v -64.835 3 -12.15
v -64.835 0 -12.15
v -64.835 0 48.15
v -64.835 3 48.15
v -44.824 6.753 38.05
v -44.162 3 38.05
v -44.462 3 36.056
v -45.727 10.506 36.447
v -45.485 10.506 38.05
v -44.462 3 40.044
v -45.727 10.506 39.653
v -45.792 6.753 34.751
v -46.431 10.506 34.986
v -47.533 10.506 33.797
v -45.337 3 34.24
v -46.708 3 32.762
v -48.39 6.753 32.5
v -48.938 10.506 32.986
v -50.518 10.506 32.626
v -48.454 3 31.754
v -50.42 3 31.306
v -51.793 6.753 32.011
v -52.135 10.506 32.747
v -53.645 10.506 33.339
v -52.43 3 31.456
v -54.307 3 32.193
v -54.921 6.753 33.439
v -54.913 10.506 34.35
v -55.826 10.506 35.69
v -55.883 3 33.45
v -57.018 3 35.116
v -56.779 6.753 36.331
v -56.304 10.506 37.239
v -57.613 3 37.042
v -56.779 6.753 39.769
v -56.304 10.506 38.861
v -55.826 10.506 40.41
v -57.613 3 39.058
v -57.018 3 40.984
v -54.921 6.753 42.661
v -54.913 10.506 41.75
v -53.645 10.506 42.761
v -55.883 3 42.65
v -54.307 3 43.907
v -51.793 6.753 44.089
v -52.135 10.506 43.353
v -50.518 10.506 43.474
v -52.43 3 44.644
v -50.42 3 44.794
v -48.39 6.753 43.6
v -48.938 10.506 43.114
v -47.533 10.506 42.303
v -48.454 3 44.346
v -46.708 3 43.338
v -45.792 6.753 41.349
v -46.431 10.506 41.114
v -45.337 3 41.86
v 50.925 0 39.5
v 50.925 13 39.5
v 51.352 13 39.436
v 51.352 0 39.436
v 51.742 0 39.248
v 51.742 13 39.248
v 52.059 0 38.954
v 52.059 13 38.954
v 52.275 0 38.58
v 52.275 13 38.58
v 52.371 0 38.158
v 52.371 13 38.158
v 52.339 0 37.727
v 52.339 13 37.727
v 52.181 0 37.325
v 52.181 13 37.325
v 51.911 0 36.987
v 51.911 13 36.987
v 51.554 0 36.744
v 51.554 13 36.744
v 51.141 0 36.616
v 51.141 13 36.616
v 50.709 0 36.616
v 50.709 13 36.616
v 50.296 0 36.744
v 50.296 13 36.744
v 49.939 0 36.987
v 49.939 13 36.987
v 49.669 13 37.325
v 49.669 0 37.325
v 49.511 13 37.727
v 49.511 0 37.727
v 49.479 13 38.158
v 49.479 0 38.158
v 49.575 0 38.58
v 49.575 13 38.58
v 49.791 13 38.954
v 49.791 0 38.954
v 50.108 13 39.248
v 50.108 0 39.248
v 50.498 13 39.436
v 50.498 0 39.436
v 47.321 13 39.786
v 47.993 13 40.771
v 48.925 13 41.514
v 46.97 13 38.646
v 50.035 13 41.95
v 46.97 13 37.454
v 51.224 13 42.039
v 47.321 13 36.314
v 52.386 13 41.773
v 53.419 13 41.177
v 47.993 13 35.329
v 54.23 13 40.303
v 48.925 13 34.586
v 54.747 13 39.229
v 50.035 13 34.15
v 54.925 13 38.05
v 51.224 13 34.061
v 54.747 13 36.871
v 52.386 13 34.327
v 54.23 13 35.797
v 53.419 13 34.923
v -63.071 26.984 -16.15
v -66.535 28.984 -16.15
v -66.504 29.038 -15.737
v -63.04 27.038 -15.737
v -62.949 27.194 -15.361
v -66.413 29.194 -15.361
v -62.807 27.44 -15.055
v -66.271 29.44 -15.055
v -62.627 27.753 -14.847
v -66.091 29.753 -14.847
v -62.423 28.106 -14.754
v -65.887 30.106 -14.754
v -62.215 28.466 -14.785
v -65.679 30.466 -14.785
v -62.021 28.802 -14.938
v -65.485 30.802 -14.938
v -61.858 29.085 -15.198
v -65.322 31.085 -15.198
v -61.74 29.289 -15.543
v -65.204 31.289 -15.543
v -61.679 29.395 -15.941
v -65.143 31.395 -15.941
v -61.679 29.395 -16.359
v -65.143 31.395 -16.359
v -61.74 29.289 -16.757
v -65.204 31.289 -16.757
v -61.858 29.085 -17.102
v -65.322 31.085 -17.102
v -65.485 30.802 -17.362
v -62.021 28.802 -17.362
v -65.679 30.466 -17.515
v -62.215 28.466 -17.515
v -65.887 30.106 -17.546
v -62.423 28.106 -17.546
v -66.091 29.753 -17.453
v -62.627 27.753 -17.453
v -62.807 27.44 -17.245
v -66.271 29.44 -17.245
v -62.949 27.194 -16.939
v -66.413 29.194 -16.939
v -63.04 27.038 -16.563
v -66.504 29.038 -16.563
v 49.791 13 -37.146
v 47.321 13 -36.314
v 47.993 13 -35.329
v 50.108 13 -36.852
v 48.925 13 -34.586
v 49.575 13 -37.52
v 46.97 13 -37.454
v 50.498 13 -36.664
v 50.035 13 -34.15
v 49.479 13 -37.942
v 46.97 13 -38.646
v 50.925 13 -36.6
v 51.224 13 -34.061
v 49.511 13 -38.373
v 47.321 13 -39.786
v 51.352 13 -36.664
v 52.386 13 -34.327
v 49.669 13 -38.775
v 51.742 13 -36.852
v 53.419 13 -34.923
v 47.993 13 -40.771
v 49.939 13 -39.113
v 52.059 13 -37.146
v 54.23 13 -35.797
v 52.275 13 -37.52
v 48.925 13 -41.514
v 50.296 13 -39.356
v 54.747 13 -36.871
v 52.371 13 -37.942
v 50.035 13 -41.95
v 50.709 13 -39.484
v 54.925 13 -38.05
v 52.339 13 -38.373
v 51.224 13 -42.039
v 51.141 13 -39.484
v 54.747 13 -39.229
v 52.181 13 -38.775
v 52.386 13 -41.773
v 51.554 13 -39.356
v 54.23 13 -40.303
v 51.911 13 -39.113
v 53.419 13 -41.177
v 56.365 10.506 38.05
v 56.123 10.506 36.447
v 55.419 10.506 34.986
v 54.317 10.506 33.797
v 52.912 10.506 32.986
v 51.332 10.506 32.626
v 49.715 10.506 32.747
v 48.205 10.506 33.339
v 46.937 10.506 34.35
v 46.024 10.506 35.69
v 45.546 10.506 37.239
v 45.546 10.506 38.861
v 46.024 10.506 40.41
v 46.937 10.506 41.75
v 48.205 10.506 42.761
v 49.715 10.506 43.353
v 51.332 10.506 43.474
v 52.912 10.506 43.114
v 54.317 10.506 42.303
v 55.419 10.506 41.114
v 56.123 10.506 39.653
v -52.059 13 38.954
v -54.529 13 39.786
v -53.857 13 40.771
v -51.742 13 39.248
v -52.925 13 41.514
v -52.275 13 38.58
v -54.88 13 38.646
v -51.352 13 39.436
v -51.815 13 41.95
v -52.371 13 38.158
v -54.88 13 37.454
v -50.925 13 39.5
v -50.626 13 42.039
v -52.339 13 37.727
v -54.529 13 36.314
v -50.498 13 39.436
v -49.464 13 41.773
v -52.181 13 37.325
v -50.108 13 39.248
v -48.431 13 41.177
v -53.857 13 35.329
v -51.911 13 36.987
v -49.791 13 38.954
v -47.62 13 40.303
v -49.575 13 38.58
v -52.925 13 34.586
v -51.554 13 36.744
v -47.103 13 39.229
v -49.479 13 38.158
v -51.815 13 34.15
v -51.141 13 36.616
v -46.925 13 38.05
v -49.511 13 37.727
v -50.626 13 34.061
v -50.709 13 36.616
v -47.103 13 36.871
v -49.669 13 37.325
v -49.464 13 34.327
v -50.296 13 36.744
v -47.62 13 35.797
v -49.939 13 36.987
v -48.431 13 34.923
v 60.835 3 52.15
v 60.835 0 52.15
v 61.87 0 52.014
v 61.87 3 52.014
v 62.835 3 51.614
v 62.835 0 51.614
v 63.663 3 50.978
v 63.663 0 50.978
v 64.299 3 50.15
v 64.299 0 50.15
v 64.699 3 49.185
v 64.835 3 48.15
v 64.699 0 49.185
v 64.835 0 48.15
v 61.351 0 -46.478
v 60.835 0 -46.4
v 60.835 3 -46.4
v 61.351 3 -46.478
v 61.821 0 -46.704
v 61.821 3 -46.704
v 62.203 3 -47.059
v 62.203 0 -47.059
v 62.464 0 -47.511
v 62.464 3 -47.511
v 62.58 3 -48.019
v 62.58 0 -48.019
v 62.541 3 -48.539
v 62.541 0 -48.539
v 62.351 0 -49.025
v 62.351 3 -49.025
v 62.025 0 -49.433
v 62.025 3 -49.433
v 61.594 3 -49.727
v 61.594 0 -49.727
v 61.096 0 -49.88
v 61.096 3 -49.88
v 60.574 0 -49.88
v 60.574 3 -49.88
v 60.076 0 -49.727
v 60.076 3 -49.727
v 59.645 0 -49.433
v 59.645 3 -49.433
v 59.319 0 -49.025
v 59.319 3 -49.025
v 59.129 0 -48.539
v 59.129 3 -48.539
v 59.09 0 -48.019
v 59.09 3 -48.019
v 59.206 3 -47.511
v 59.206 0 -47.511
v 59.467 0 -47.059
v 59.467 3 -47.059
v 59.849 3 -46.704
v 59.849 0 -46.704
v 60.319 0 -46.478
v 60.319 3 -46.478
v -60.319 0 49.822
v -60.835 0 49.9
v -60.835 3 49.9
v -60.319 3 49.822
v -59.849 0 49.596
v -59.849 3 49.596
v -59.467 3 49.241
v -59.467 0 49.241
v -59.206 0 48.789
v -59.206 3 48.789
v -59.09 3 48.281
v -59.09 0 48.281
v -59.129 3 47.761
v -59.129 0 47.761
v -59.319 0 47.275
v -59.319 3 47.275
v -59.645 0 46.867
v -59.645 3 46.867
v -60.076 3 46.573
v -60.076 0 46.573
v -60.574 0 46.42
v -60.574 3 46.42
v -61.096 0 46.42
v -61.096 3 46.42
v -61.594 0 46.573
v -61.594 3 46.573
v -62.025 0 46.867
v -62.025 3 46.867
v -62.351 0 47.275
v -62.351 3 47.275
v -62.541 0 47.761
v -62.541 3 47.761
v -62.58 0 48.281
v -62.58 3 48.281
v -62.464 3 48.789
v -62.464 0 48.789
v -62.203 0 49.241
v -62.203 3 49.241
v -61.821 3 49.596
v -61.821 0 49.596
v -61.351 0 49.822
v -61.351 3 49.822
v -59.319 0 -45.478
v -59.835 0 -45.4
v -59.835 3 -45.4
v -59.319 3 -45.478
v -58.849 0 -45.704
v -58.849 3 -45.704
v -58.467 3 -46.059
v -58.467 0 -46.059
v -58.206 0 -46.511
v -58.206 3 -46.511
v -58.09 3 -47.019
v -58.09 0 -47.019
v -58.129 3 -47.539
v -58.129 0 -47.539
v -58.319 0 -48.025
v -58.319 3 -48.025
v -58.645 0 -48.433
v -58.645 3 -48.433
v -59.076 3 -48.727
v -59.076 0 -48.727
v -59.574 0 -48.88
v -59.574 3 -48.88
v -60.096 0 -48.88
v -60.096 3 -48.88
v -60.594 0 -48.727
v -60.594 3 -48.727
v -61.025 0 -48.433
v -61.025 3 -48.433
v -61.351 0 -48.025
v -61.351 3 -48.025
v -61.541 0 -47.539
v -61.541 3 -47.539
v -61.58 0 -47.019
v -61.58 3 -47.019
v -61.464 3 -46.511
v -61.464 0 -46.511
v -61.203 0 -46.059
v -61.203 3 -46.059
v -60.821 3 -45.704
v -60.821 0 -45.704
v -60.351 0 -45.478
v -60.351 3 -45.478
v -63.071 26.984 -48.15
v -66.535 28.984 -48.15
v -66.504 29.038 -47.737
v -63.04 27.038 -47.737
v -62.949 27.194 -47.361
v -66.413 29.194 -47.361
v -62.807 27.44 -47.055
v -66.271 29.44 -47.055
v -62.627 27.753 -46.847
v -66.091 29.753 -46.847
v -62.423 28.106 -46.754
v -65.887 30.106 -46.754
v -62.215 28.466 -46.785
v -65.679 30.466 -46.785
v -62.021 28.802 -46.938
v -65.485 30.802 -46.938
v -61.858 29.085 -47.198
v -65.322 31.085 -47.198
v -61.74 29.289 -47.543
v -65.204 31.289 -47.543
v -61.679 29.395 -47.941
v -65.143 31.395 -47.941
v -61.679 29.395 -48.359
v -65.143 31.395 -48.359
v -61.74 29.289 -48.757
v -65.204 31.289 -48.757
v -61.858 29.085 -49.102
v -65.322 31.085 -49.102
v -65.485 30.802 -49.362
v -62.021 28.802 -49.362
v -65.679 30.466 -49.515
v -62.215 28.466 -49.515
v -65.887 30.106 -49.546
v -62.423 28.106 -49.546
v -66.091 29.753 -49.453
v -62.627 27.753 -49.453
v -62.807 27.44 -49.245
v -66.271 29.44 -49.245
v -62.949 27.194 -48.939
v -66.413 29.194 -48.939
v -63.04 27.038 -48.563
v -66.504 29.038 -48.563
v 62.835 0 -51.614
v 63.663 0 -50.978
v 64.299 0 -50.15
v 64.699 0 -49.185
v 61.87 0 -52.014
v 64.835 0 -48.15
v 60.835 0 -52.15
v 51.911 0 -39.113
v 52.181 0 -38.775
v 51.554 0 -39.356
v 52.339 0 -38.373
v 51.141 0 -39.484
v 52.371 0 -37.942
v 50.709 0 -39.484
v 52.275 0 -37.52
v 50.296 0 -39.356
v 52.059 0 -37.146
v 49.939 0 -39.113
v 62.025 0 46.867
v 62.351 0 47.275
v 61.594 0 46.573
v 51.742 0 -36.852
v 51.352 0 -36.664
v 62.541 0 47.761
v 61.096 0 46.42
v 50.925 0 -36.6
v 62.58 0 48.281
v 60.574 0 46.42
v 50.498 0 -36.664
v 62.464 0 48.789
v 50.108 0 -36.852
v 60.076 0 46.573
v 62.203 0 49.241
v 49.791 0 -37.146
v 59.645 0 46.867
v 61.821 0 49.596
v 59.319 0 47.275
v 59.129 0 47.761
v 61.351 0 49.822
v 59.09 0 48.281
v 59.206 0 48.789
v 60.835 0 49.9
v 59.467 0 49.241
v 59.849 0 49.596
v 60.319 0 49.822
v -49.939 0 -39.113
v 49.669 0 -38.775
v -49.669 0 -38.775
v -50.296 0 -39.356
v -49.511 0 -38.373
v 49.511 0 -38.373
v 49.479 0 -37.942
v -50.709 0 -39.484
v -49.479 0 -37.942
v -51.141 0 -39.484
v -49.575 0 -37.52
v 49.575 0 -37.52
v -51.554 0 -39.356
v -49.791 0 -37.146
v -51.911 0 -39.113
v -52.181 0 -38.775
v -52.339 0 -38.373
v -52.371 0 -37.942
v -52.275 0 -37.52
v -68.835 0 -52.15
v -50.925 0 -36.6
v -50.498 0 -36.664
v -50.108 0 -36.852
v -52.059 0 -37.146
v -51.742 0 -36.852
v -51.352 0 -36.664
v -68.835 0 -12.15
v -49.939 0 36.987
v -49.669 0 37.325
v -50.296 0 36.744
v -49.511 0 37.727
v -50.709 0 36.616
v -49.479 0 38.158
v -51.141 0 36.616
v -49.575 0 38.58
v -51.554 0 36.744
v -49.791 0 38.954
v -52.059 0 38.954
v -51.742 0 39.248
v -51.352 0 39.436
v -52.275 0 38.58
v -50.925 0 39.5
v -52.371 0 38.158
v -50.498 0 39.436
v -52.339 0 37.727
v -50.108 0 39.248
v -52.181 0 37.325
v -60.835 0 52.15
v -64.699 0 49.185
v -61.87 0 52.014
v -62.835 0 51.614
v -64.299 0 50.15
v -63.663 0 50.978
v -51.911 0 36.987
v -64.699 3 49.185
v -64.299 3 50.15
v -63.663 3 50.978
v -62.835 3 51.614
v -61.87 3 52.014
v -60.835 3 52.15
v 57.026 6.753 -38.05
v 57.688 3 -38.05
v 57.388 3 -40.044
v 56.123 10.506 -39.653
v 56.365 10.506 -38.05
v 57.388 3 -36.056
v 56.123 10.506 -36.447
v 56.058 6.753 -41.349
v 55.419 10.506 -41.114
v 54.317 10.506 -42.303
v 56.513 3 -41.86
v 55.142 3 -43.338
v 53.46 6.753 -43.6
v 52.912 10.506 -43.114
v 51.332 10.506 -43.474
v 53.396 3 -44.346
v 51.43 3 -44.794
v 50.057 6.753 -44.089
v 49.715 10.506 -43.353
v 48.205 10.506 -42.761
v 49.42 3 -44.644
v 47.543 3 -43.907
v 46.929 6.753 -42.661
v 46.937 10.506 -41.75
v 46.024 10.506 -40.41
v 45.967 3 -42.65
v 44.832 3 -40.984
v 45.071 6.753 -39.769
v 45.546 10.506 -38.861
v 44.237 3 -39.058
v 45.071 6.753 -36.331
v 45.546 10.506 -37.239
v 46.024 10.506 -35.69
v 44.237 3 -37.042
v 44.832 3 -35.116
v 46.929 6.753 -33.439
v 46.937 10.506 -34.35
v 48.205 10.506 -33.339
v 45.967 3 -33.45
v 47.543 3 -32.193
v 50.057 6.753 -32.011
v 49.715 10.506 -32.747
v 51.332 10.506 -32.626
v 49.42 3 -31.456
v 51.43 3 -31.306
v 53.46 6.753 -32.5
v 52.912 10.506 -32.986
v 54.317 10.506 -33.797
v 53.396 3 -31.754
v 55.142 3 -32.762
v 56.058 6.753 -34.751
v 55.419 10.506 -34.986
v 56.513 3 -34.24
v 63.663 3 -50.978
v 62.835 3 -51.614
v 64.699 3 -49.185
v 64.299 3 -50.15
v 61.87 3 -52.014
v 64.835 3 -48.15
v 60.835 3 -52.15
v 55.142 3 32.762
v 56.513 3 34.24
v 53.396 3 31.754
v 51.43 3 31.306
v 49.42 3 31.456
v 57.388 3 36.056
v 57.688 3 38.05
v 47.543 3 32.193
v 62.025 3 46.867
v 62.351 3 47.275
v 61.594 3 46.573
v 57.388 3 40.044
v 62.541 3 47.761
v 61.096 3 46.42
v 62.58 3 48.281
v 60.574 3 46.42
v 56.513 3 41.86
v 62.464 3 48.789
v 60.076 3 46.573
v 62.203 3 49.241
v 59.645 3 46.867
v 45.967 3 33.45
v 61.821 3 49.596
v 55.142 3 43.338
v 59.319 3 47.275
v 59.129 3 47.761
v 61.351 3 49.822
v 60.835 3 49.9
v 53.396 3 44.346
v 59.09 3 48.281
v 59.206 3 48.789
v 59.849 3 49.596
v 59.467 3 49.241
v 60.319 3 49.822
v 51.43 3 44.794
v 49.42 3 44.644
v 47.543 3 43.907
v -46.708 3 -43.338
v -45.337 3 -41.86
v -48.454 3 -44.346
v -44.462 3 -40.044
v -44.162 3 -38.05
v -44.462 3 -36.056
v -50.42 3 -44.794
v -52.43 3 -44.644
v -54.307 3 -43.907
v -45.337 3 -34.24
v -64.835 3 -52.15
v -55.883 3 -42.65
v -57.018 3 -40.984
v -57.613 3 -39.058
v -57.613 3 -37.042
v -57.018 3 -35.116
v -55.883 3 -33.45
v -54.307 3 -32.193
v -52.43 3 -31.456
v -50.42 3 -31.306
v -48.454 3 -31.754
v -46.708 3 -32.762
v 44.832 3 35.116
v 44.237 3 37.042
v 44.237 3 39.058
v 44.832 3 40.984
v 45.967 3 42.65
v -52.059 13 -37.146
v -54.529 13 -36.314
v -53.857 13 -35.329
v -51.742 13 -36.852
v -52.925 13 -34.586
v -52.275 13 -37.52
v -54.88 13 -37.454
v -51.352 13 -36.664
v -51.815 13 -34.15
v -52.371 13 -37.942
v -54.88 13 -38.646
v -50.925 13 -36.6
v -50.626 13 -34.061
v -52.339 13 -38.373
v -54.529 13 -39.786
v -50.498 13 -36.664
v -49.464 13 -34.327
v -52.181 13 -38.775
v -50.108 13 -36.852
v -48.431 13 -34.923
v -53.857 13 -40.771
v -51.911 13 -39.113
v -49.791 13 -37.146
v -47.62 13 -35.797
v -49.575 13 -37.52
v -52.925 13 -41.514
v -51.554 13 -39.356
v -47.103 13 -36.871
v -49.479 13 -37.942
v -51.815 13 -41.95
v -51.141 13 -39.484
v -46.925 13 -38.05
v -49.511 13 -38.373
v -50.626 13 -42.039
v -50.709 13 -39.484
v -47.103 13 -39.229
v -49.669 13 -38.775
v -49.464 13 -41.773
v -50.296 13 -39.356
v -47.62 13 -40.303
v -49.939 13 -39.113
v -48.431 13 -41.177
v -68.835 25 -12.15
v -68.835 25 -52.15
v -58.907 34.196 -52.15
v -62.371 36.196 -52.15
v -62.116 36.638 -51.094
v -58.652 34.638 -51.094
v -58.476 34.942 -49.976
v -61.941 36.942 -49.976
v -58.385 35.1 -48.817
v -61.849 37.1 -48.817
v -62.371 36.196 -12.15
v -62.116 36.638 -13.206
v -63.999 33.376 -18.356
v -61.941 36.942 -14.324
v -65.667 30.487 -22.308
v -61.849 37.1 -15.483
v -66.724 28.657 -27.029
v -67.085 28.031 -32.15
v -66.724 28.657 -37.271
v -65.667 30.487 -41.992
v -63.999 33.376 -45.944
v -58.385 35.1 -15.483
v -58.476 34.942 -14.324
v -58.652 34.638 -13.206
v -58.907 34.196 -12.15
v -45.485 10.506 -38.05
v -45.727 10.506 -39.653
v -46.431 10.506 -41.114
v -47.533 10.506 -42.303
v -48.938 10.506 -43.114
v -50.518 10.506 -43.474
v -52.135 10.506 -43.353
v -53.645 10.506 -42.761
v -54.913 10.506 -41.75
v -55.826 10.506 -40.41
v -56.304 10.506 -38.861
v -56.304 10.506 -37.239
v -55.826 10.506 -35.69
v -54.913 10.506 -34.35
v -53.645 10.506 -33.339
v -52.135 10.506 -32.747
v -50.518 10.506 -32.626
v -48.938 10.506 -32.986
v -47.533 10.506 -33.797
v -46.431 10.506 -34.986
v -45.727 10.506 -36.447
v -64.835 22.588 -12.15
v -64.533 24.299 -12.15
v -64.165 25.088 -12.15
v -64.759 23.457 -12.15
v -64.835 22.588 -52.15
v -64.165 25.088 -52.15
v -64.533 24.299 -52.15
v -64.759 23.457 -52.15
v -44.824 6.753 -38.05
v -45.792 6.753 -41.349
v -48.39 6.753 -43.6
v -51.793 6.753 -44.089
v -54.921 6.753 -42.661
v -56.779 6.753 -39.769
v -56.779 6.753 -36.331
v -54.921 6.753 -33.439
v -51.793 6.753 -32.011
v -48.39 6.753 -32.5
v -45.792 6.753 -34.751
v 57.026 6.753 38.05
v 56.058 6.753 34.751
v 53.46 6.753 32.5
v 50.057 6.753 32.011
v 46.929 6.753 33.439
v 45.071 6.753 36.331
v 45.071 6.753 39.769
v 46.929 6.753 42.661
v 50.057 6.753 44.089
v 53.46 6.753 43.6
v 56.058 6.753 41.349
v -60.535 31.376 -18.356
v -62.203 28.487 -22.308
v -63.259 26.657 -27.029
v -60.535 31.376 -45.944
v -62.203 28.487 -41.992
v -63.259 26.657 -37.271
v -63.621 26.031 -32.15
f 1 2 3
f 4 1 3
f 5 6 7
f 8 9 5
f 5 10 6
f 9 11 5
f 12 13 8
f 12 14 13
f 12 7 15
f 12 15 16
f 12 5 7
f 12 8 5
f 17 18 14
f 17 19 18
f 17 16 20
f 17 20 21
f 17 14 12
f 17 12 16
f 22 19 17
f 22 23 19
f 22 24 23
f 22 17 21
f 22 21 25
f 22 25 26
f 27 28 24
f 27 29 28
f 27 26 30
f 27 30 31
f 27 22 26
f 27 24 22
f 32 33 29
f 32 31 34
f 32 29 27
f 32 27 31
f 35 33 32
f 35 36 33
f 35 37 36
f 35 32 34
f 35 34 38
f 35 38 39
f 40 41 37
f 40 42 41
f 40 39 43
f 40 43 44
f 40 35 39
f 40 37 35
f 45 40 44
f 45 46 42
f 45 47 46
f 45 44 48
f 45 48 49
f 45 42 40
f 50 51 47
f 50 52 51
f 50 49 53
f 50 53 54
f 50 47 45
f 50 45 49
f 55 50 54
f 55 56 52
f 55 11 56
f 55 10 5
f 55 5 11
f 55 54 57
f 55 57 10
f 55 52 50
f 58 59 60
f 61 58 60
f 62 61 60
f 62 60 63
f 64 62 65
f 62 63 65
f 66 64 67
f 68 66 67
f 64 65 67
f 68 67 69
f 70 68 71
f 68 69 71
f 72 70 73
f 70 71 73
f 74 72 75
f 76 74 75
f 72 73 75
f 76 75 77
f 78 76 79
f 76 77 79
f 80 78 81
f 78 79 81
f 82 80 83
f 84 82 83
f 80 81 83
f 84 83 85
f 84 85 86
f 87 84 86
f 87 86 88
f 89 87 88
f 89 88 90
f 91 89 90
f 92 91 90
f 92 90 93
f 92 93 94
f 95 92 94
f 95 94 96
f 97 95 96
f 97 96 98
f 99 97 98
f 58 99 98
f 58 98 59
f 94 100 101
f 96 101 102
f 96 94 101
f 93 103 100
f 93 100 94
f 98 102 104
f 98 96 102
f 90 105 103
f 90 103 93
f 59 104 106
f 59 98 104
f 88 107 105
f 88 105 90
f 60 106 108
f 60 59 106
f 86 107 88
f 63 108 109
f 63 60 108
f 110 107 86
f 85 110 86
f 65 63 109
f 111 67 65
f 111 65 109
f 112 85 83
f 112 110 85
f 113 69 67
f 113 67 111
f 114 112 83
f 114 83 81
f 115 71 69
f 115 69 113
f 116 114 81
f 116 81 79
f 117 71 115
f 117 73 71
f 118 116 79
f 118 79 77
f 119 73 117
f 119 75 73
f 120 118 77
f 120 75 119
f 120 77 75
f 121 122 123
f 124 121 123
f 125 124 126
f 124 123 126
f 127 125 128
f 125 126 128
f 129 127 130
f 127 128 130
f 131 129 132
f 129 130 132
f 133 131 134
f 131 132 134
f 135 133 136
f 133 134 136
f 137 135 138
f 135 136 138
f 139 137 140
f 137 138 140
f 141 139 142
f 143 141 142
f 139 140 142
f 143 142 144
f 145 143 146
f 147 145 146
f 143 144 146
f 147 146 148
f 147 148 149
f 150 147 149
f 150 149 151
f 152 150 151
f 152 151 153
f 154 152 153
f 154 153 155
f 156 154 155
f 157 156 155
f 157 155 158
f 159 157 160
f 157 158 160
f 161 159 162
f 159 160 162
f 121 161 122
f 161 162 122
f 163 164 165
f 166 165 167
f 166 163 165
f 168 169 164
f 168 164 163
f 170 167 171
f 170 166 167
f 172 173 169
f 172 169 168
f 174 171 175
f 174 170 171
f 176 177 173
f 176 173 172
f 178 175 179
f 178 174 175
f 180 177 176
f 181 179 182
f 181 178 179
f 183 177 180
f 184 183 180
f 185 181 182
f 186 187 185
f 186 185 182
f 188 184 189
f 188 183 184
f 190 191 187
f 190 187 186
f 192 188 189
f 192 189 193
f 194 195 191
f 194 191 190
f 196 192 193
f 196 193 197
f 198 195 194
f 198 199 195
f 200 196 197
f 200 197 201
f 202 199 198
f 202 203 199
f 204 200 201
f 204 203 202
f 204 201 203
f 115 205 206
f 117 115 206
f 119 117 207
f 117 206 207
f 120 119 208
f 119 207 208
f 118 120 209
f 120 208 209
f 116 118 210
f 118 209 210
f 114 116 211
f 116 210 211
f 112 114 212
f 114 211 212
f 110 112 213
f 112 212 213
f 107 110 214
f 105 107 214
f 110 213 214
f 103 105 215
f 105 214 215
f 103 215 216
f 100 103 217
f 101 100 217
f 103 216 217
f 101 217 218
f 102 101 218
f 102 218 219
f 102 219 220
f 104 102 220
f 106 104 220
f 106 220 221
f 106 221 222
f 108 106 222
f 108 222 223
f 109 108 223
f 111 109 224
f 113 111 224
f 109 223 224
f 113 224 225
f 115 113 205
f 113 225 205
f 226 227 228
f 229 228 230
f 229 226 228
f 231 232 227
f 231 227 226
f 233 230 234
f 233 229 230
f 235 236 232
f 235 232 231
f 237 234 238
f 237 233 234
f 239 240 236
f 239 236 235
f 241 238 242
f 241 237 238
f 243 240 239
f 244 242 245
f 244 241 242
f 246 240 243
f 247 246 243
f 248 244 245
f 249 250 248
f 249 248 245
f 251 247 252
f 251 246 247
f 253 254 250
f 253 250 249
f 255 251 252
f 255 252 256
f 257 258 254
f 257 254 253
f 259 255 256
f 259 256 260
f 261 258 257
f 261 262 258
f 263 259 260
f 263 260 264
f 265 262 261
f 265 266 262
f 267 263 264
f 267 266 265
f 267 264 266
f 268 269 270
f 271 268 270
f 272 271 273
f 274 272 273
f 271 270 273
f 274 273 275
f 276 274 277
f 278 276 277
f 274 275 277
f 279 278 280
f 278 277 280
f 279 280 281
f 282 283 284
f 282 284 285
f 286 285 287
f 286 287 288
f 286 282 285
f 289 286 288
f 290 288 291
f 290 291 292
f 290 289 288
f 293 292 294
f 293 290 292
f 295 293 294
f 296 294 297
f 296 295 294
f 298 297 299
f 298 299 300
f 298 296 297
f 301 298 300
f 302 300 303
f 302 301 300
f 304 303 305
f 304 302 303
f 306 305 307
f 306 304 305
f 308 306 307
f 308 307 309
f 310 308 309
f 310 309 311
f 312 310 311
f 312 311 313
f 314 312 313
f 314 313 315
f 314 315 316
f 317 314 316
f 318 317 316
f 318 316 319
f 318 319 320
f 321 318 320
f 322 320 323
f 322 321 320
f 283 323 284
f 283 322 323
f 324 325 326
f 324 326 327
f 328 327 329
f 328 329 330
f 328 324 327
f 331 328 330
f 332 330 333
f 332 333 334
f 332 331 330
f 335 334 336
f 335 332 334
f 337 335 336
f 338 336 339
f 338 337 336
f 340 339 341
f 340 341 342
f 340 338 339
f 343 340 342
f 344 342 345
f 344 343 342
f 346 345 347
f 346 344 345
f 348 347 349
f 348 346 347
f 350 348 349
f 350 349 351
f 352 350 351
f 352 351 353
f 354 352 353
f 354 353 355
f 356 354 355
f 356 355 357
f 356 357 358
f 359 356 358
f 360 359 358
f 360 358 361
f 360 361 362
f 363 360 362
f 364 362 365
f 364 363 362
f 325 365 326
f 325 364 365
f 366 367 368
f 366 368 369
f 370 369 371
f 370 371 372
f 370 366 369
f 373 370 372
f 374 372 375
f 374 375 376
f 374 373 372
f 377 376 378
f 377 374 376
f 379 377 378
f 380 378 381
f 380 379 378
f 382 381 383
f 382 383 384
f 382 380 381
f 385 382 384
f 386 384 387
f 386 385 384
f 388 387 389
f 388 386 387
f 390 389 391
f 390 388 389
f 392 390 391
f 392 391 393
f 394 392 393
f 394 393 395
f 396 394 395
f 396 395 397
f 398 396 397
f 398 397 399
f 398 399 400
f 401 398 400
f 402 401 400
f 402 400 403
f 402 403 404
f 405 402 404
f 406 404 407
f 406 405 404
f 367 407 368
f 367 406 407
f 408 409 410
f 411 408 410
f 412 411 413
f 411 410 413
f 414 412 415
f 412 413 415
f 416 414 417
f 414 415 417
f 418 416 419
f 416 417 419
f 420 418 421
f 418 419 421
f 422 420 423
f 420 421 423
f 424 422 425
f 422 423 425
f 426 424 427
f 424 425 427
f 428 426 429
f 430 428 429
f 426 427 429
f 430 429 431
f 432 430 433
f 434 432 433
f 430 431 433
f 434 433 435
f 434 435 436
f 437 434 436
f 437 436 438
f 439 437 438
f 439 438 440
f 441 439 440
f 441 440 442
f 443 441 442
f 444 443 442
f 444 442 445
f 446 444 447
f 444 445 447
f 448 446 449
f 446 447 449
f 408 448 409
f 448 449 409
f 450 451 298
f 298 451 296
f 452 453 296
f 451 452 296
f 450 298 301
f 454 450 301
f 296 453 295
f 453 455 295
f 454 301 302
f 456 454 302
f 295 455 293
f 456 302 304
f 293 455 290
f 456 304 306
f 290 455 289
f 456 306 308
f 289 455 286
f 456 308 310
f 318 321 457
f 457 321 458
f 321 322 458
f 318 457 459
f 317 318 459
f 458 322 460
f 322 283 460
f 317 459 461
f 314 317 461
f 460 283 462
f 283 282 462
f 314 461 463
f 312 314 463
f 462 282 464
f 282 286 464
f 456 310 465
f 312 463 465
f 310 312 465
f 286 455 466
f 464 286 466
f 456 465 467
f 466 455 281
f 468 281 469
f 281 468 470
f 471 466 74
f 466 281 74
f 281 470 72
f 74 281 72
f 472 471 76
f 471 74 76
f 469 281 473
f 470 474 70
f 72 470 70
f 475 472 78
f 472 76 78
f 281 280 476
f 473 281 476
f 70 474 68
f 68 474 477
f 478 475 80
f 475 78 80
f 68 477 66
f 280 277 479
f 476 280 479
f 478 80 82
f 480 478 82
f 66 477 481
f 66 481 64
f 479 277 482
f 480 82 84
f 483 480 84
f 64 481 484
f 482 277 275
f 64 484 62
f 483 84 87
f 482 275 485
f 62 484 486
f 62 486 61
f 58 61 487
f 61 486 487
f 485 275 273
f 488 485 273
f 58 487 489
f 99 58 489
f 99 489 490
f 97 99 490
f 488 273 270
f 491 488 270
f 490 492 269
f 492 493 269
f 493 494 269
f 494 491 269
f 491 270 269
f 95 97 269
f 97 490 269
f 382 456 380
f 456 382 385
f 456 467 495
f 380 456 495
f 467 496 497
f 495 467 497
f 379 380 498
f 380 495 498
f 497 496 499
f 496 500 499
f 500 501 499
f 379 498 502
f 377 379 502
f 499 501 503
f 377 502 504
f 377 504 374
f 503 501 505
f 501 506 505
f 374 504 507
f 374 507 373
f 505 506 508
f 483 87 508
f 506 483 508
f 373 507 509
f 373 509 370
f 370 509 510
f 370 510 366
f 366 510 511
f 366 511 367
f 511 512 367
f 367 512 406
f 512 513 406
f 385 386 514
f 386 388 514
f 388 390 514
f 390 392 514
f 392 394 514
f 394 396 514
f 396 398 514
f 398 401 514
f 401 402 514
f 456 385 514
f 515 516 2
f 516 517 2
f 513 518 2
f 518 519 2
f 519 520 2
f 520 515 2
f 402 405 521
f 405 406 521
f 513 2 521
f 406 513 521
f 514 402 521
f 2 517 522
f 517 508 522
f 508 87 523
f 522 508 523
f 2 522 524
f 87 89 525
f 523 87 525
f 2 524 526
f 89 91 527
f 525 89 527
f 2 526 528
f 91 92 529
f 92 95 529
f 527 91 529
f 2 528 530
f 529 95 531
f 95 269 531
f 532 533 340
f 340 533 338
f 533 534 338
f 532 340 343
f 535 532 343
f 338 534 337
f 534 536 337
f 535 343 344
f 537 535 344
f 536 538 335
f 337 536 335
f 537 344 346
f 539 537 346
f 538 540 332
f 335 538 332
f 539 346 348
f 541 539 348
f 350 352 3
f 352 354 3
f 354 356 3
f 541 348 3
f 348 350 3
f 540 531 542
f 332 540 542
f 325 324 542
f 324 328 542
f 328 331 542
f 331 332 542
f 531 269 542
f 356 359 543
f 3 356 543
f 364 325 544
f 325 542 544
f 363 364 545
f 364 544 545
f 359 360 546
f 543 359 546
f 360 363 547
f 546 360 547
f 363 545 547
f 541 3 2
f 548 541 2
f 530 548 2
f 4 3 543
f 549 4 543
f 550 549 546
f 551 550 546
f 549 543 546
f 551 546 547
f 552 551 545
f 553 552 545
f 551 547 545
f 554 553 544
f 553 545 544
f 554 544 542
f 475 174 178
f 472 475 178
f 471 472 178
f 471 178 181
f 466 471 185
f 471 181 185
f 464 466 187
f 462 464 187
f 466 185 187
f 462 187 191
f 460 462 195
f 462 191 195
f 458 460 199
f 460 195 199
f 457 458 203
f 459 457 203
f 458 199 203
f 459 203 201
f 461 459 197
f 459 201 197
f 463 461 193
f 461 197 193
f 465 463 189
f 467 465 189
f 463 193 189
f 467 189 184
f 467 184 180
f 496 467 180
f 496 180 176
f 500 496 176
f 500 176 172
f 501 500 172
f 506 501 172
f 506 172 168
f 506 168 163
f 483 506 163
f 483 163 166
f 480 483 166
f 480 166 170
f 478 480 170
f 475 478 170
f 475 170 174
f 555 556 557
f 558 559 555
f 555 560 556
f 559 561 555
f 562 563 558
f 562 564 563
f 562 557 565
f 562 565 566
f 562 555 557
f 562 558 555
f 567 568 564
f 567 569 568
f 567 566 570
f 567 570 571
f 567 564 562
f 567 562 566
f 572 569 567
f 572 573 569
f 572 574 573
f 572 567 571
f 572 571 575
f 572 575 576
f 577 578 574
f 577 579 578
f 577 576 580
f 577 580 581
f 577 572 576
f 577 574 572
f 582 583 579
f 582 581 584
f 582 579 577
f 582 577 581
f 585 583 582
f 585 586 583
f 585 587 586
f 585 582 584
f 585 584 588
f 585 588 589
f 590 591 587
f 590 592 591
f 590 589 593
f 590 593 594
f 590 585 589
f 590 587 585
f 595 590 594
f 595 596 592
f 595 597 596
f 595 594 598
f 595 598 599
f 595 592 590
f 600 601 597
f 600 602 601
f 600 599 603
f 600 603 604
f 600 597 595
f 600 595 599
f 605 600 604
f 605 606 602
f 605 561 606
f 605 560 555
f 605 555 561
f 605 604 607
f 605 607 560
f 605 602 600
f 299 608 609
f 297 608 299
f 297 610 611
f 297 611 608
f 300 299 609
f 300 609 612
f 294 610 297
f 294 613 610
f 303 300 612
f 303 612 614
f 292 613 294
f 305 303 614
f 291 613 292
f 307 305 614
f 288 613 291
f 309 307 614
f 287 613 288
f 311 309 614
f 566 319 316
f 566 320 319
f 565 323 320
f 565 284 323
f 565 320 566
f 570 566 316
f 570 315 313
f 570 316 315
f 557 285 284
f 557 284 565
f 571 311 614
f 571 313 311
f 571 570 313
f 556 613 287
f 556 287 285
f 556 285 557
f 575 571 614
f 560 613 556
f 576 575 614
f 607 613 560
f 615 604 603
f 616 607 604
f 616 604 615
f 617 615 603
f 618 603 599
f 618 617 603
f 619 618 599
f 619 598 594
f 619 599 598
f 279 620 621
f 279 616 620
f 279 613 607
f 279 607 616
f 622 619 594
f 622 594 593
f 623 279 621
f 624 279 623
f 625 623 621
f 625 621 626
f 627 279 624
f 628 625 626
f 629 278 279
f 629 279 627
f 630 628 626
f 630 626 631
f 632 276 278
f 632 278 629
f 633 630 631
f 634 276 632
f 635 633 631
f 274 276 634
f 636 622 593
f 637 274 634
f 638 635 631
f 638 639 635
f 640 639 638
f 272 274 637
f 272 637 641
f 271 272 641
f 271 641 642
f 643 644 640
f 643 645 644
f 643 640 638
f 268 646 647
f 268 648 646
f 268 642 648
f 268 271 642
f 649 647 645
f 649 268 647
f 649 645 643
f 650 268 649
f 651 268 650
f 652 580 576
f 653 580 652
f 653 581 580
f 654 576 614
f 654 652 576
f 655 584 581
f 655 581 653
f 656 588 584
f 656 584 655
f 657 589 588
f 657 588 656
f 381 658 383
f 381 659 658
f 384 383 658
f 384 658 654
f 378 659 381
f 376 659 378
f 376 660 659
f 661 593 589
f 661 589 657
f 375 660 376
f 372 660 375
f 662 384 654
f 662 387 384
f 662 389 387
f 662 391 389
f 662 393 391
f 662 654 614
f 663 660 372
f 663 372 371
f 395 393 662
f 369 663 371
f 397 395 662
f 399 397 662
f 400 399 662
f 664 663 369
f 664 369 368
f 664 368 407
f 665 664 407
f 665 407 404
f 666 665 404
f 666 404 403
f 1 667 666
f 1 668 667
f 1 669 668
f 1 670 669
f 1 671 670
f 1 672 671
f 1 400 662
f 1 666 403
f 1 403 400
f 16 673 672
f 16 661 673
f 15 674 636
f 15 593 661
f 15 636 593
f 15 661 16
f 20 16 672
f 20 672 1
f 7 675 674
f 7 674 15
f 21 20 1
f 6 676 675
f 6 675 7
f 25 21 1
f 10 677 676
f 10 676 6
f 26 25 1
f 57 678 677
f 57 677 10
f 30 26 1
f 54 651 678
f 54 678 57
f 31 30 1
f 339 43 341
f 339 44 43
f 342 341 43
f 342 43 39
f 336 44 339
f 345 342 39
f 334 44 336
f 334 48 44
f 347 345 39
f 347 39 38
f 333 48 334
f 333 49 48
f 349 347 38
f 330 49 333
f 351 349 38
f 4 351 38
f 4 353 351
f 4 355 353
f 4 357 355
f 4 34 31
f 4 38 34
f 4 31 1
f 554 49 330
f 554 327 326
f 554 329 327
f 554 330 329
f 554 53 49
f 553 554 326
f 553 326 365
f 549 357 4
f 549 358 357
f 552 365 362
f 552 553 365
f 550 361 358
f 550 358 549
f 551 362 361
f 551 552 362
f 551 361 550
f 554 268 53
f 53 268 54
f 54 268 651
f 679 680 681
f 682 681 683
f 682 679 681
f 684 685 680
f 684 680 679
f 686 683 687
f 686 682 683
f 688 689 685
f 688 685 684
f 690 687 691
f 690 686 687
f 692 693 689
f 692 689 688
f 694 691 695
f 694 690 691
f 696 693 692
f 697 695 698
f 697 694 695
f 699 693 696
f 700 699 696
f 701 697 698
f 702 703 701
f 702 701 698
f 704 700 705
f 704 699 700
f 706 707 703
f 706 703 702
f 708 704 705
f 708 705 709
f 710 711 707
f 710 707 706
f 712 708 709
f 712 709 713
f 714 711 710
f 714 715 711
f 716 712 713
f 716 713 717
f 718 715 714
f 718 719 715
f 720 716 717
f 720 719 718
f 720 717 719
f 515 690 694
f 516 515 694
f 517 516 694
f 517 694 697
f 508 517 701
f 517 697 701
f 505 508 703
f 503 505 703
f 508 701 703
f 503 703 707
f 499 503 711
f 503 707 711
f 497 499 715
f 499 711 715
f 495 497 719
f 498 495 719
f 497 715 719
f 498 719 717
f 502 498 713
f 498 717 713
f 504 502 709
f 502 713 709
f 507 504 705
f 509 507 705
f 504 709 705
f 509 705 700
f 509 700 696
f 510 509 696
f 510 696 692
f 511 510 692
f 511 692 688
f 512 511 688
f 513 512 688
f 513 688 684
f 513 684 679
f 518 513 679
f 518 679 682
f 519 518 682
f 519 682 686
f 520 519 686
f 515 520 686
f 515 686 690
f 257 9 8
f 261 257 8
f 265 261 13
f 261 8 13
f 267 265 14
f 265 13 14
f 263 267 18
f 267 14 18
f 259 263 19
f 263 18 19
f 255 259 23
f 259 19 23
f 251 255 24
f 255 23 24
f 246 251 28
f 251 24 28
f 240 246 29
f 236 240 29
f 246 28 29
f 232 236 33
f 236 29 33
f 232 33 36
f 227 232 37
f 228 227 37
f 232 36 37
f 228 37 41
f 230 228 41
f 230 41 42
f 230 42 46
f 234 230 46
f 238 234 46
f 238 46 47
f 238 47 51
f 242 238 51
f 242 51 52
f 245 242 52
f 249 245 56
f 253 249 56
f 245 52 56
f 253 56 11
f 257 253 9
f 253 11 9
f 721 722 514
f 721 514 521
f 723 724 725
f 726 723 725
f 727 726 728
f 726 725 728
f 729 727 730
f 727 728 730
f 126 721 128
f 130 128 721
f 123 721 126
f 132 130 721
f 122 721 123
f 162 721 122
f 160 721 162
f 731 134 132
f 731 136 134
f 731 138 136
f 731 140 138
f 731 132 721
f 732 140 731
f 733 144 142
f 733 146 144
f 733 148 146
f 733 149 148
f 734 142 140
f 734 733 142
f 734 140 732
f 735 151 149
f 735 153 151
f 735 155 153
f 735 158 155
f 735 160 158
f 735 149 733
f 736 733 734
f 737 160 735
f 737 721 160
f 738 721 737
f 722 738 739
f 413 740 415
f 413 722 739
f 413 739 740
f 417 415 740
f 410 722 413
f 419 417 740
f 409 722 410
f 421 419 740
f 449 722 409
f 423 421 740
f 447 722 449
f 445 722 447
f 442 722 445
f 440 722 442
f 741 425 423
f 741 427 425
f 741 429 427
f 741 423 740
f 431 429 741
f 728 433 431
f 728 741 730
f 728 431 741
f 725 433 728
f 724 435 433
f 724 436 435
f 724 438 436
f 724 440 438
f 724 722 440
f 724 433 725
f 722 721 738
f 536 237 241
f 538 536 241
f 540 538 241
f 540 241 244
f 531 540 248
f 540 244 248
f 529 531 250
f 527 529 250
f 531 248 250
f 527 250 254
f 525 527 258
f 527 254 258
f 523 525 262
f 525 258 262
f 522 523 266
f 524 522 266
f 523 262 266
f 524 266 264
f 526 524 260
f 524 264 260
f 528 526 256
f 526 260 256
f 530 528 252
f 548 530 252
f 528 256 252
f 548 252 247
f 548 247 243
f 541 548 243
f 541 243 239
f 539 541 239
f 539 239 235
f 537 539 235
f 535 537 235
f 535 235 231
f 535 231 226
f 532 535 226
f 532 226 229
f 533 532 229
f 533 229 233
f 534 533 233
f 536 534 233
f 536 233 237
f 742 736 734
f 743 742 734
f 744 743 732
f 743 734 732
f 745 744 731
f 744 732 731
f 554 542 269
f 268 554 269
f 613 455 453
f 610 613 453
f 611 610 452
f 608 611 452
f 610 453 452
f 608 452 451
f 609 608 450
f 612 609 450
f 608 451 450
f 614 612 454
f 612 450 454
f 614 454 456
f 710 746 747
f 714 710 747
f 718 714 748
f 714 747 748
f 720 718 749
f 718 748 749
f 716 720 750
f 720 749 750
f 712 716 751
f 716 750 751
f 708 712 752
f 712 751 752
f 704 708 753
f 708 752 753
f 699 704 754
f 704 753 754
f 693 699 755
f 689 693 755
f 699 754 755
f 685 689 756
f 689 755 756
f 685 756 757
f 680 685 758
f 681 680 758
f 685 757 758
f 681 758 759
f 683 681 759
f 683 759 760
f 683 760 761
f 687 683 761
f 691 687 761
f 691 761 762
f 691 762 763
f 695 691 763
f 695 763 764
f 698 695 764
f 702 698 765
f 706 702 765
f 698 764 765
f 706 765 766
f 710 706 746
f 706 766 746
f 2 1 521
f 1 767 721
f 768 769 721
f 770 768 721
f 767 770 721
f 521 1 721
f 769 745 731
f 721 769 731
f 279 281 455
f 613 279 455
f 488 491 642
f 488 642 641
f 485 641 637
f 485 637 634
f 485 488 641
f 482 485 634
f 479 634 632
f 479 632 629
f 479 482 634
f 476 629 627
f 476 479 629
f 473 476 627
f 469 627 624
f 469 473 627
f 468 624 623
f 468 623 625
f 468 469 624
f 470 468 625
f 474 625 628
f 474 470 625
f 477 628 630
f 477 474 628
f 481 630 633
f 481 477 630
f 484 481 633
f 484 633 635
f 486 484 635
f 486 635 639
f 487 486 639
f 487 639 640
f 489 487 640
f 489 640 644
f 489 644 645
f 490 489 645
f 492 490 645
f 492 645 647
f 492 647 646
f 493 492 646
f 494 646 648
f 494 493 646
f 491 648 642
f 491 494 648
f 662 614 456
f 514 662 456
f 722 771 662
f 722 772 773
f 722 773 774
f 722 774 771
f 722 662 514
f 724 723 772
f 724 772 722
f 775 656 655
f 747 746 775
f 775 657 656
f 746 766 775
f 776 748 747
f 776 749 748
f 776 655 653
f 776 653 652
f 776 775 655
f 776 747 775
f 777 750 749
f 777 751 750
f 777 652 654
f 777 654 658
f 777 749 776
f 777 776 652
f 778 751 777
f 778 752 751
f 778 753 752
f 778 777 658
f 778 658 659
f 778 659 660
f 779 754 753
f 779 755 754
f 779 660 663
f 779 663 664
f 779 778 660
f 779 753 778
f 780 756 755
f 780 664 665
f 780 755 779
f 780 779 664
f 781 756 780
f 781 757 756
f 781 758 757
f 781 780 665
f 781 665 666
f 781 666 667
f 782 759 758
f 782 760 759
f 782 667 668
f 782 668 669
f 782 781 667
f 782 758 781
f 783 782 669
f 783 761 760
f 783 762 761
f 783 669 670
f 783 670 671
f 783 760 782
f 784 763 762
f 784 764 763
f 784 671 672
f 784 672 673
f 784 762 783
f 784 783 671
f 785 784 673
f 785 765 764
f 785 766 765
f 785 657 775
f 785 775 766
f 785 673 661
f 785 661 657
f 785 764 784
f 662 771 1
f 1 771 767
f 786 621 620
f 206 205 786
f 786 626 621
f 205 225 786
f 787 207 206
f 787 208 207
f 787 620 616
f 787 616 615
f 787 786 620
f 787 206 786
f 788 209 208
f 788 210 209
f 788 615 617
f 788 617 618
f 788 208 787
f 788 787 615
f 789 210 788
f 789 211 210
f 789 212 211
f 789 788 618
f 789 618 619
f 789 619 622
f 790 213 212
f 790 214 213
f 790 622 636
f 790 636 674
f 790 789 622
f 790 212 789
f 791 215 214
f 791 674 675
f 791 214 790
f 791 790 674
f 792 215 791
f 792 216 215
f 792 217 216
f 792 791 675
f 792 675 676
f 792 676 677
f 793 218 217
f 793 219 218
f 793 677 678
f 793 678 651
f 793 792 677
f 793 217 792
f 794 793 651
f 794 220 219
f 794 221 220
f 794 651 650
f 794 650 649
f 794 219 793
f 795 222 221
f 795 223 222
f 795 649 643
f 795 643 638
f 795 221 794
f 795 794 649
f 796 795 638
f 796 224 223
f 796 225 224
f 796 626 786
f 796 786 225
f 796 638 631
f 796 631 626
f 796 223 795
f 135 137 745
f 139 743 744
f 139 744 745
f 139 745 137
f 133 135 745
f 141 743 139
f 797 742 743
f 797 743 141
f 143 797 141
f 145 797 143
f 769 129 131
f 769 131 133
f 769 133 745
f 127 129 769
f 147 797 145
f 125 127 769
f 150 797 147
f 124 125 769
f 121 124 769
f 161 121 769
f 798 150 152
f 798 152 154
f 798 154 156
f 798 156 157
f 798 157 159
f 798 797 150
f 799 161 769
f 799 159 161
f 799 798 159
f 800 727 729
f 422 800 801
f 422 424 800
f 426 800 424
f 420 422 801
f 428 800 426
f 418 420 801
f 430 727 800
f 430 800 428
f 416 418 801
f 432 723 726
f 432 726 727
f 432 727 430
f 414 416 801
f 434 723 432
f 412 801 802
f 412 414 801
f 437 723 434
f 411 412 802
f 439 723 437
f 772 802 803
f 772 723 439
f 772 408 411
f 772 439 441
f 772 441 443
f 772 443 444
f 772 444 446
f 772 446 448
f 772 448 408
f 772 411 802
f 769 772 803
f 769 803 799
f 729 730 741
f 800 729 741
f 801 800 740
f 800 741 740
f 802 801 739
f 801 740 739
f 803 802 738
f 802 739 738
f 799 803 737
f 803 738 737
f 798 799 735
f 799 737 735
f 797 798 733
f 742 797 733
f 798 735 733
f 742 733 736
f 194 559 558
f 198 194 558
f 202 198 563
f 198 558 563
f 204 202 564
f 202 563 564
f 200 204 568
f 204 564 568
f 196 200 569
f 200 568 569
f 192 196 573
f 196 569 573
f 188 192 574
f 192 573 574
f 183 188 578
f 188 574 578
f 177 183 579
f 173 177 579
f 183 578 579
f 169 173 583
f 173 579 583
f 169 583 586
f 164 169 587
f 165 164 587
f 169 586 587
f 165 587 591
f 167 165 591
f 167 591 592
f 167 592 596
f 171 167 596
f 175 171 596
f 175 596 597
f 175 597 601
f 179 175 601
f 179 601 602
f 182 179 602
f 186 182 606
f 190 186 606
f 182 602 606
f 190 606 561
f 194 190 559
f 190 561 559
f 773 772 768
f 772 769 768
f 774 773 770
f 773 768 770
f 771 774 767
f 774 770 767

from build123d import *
from OCP.BRepFilletAPI import BRepFilletAPI_MakeChamfer

# Parameters (mm, degrees)
SKETCH2_R                     = 1.75
BOSS_EXTRUDE1_DEPTH           = 3
BOSS_EXTRUDE2_START           = 10
SKETCH3_R                     = 5
BOSS_EXTRUDE2_DEPTH           = 13
BOSS_EXTRUDE2_DRAFT           = 10
BOSS_EXTRUDE2_PROFILE_2_DEPTH = 13
BOSS_EXTRUDE2_PROFILE_2_DRAFT = 10
BOSS_EXTRUDE2_PROFILE_3_DEPTH = 13
BOSS_EXTRUDE2_PROFILE_3_DRAFT = 10
BOSS_EXTRUDE2_PROFILE_4_DEPTH = 13
BOSS_EXTRUDE2_PROFILE_4_DRAFT = 10
SKETCH4_R                     = 1.45
CUT_EXTRUDE1_DEPTH            = 85.215198895
CHAMFER1_SIZE                 = 1
CHAMFER1_SIZE2                = 2.532088886
SKETCH5_W                     = 40
SKETCH5_H                     = 25
BOSS_EXTRUDE3_DEPTH           = 4
BOSS_EXTRUDE4_DEPTH           = 3
BOSS_EXTRUDE5_DEPTH           = 40
SKETCH8_R                     = 1.4
CUT_EXTRUDE3_DEPTH            = 4
FILLET1_R                     = 5


with BuildPart() as part:
    # Sketch2 → Boss-Extrude1 (new body)
    with BuildSketch(Plane(origin=(0, 0, 0), x_dir=(1, 0, 0), z_dir=(0, 1, 0))):
        with BuildLine():
            Line((-64.835, 47.15), (-64.835, -48.15))
            ThreePointArc((-64.835, -48.15), (-63.663427125, -50.978427125), (-60.835, -52.15))
            Line((-60.835, -52.15), (60.835, -52.15))
            ThreePointArc((60.835, -52.15), (63.663427125, -50.978427125), (64.835, -48.15))
            Line((64.835, -48.15), (64.835, 48.15))
            ThreePointArc((64.835, 48.15), (63.663427125, 50.978427125), (60.835, 52.15))
            Line((60.835, 52.15), (-59.835, 52.15))
            ThreePointArc((-59.835, 52.15), (-63.370533906, 50.685533906), (-64.835, 47.15))
        make_face()
        with Locations(Location((-59.835, 47.15, 0), (0, 0, 270))):
            Circle(SKETCH2_R, mode=Mode.SUBTRACT)
        with Locations(Location((60.835, 48.15, 0), (0, 0, 270))):
            Circle(SKETCH2_R, mode=Mode.SUBTRACT)
        with Locations(Location((60.835, -48.15, 0), (0, 0, 270))):
            Circle(SKETCH2_R, mode=Mode.SUBTRACT)
        with Locations(Location((-60.835, -48.15, 0), (0, 0, 270))):
            Circle(SKETCH2_R, mode=Mode.SUBTRACT)
    extrude(amount=BOSS_EXTRUDE1_DEPTH)


with BuildPart() as boss_extrude2_tool:
    # Sketch3 → Boss-Extrude2 (with draft: the straight prism first)
    with BuildSketch(Plane(origin=(0, 3, 0), x_dir=(1, 0, 0), z_dir=(0, 1, 0)).offset(BOSS_EXTRUDE2_START)):
        with Locations((-50.925, 38.05)):
            Circle(SKETCH3_R)
    extrude(amount=-BOSS_EXTRUDE2_DEPTH)
    # Boss-Extrude2: the draft: its side faces are tilted about the plane it starts from
    boss_extrude2_sides = [boss_extrude2_tool.faces().sort_by_distance(p)[0] for p in [
        (-55.925, 6.5, -38.05),
    ]]
    draft(boss_extrude2_sides, Plane(origin=(0, 3, 0), x_dir=(1, 0, 0), z_dir=(0, 1, 0)).offset(BOSS_EXTRUDE2_START), BOSS_EXTRUDE2_DRAFT)


with BuildPart() as part_1:
    add(part.part)

    # Boss-Extrude2: add boss_extrude2_tool
    add(boss_extrude2_tool.part)


with BuildPart() as boss_extrude2_profile_2_tool:
    # Sketch3 → Boss-Extrude2 profile 2 (with draft: the straight prism first)
    with BuildSketch(Plane(origin=(0, 3, 0), x_dir=(1, 0, 0), z_dir=(0, 1, 0)).offset(BOSS_EXTRUDE2_START)):
        with Locations((50.925, 38.05)):
            Circle(SKETCH3_R)
    extrude(amount=-BOSS_EXTRUDE2_PROFILE_2_DEPTH)
    # Boss-Extrude2 profile 2: the draft: its side faces are tilted about the plane it starts from
    boss_extrude2_profile_2_sides = [boss_extrude2_profile_2_tool.faces().sort_by_distance(p)[0] for p in [
        (45.925, 6.5, -38.05),
    ]]
    draft(boss_extrude2_profile_2_sides, Plane(origin=(0, 3, 0), x_dir=(1, 0, 0), z_dir=(0, 1, 0)).offset(BOSS_EXTRUDE2_START), BOSS_EXTRUDE2_PROFILE_2_DRAFT)


with BuildPart() as part_2:
    add(part_1.part)

    # Boss-Extrude2 profile 2: add boss_extrude2_profile_2_tool
    add(boss_extrude2_profile_2_tool.part)


with BuildPart() as boss_extrude2_profile_3_tool:
    # Sketch3 → Boss-Extrude2 profile 3 (with draft: the straight prism first)
    with BuildSketch(Plane(origin=(0, 3, 0), x_dir=(1, 0, 0), z_dir=(0, 1, 0)).offset(BOSS_EXTRUDE2_START)):
        with Locations((-50.925, -38.05)):
            Circle(SKETCH3_R)
    extrude(amount=-BOSS_EXTRUDE2_PROFILE_3_DEPTH)
    # Boss-Extrude2 profile 3: the draft: its side faces are tilted about the plane it starts from
    boss_extrude2_profile_3_sides = [boss_extrude2_profile_3_tool.faces().sort_by_distance(p)[0] for p in [
        (-55.925, 6.5, 38.05),
    ]]
    draft(boss_extrude2_profile_3_sides, Plane(origin=(0, 3, 0), x_dir=(1, 0, 0), z_dir=(0, 1, 0)).offset(BOSS_EXTRUDE2_START), BOSS_EXTRUDE2_PROFILE_3_DRAFT)


with BuildPart() as part_3:
    add(part_2.part)

    # Boss-Extrude2 profile 3: add boss_extrude2_profile_3_tool
    add(boss_extrude2_profile_3_tool.part)


with BuildPart() as boss_extrude2_profile_4_tool:
    # Sketch3 → Boss-Extrude2 profile 4 (with draft: the straight prism first)
    with BuildSketch(Plane(origin=(0, 3, 0), x_dir=(1, 0, 0), z_dir=(0, 1, 0)).offset(BOSS_EXTRUDE2_START)):
        with Locations((50.925, -38.05)):
            Circle(SKETCH3_R)
    extrude(amount=-BOSS_EXTRUDE2_PROFILE_4_DEPTH)
    # Boss-Extrude2 profile 4: the draft: its side faces are tilted about the plane it starts from
    boss_extrude2_profile_4_sides = [boss_extrude2_profile_4_tool.faces().sort_by_distance(p)[0] for p in [
        (45.925, 6.5, 38.05),
    ]]
    draft(boss_extrude2_profile_4_sides, Plane(origin=(0, 3, 0), x_dir=(1, 0, 0), z_dir=(0, 1, 0)).offset(BOSS_EXTRUDE2_START), BOSS_EXTRUDE2_PROFILE_4_DRAFT)


with BuildPart() as part_4:
    add(part_3.part)

    # Boss-Extrude2 profile 4: add boss_extrude2_profile_4_tool
    add(boss_extrude2_profile_4_tool.part)

    # Sketch4 → Cut-Extrude1 (cut, through all)
    with BuildSketch(Plane(origin=(0, 13, 0), x_dir=(1, 0, 0), z_dir=(0, 1, 0))):
        with Locations(Location((-50.925, 38.05, 0), (0, 0, 270))):
            Circle(SKETCH4_R)
        with Locations(Location((50.925, 38.05, 0), (0, 0, 270))):
            Circle(SKETCH4_R)
        with Locations(Location((50.925, -38.05, 0), (0, 0, 270))):
            Circle(SKETCH4_R)
        with Locations(Location((-50.925, -38.05, 0), (0, 0, 270))):
            Circle(SKETCH4_R)
    extrude(amount=-CUT_EXTRUDE1_DEPTH, mode=Mode.SUBTRACT)

    # Chamfer1: one chamfer whose edges measure the first distance from different faces: ONE call of the kernel's chamfer builder (chamfer() names one face for all edges)
    chamfer1_edges_1 = [part_4.edges().sort_by_distance(p)[0] for p in [
        (-55.925, 13, -38.05),
    ]]
    chamfer1_side_1 = [part_4.faces().sort_by_distance(p)[0] for p in [
        (-55.783578644, 13, -38.05),
    ]]
    chamfer1_edges_2 = [part_4.edges().sort_by_distance(p)[0] for p in [
        (45.925, 13, -38.05),
    ]]
    chamfer1_side_2 = [part_4.faces().sort_by_distance(p)[0] for p in [
        (46.066421356, 13, -38.05),
    ]]
    chamfer1_edges_3 = [part_4.edges().sort_by_distance(p)[0] for p in [
        (-55.925, 13, 38.05),
    ]]
    chamfer1_side_3 = [part_4.faces().sort_by_distance(p)[0] for p in [
        (-55.783578644, 13, 38.05),
    ]]
    chamfer1_edges_4 = [part_4.edges().sort_by_distance(p)[0] for p in [
        (45.925, 13, 38.05),
    ]]
    chamfer1_side_4 = [part_4.faces().sort_by_distance(p)[0] for p in [
        (46.066421356, 13, 38.05),
    ]]
    chamfer1 = BRepFilletAPI_MakeChamfer(part_4.part.solid().wrapped)
    for e in chamfer1_edges_1:
        chamfer1.Add(CHAMFER1_SIZE, CHAMFER1_SIZE2, e.wrapped, chamfer1_side_1[0].wrapped)  # the first distance lies on this face
    for e in chamfer1_edges_2:
        chamfer1.Add(CHAMFER1_SIZE, CHAMFER1_SIZE2, e.wrapped, chamfer1_side_2[0].wrapped)  # the first distance lies on this face
    for e in chamfer1_edges_3:
        chamfer1.Add(CHAMFER1_SIZE, CHAMFER1_SIZE2, e.wrapped, chamfer1_side_3[0].wrapped)  # the first distance lies on this face
    for e in chamfer1_edges_4:
        chamfer1.Add(CHAMFER1_SIZE, CHAMFER1_SIZE2, e.wrapped, chamfer1_side_4[0].wrapped)  # the first distance lies on this face
    add(Compound.cast(chamfer1.Shape()), mode=Mode.REPLACE)

    # Sketch5 → Boss-Extrude3 (add)
    with BuildSketch(Plane.ZY.offset(64.835)):
        with Locations((-32.15, 12.5)):
            Rectangle(SKETCH5_W, SKETCH5_H)
    extrude(amount=BOSS_EXTRUDE3_DEPTH)

    # Sketch6 → Boss-Extrude4 (add)
    with BuildSketch(Plane.XZ):
        with BuildLine():
            Line((-59.835, -52.15), (-64.835, -52.15))
            Line((-64.835, -52.15), (-64.835, -47.15))
            ThreePointArc((-64.835, -47.15), (-63.370533906, -50.685533906), (-59.835, -52.15))
        make_face()
    extrude(amount=-BOSS_EXTRUDE4_DEPTH)

    # Sketch7 → Boss-Extrude5 (add)
    with BuildSketch(Plane(origin=(0, 0, -52.15), x_dir=(-1, 0, 0), z_dir=(0, 0, -1))):
        Polygon((52.604700032, 45.111704166), (64.835, 23.92820323), (64.835, 25), (68.835, 25), (56.068801648, 47.111704166), align=None)
    extrude(amount=-BOSS_EXTRUDE5_DEPTH)

    # Sketch8 → Cut-Extrude3 (cut)
    with BuildSketch(Plane(origin=(-62.451567547, 36.056429335, 0), x_dir=(0, 0, 1), z_dir=(-0.866025403784438, 0.5000000000000011, 0))):
        with BuildLine():
            Line((-50.309630324, 12.765531799), (-52.15, 12.765531799))
            Line((-52.15, 12.765531799), (-52.15, 0.161338325))
            ThreePointArc((-52.15, 0.161338325), (-50.541368872, 0.867357709), (-48.817423041, 1.205245636))
            ThreePointArc((-48.817423041, 1.205245636), (-50.497778219, 6.864795081), (-50.309630324, 12.765531799))
        make_face()
        with BuildLine():
            Line((-13.990369676, 12.765531799), (-50.309630324, 12.765531799))
            ThreePointArc((-50.309630324, 12.765531799), (-50.497778219, 6.864795081), (-48.817423041, 1.205245636))
            ThreePointArc((-48.817423041, 1.205245636), (-32.15, -9.266864905), (-15.482576959, 1.205245636))
            ThreePointArc((-15.482576959, 1.205245636), (-14.1139621, 5.11593497), (-13.65, 9.233135095))
            ThreePointArc((-13.65, 9.233135095), (-13.735289019, 11.007513718), (-13.990369676, 12.765531799))
        make_face()
        with BuildLine():
            ThreePointArc((-13.990369676, 12.765531799), (-32.15, 27.733135095), (-50.309630324, 12.765531799))
            Line((-50.309630324, 12.765531799), (-13.990369676, 12.765531799))
        make_face()
        with BuildLine():
            Line((-12.15, 12.765531799), (-13.990369676, 12.765531799))
            ThreePointArc((-13.990369676, 12.765531799), (-13.735289019, 11.007513718), (-13.65, 9.233135095))
            ThreePointArc((-13.65, 9.233135095), (-14.1139621, 5.11593497), (-15.482576959, 1.205245636))
            ThreePointArc((-15.482576959, 1.205245636), (-13.758631128, 0.867357709), (-12.15, 0.161338325))
            Line((-12.15, 0.161338325), (-12.15, 12.765531799))
        make_face()
        with Locations(Location((-16.15, -6.766864905, 0), (0, 0, 270))):
            Circle(SKETCH8_R)
        with Locations(Location((-48.15, -6.766864905, 0), (0, 0, 270))):
            Circle(SKETCH8_R)
    extrude(amount=-CUT_EXTRUDE3_DEPTH, mode=Mode.SUBTRACT)

    # Fillet1
    fillet1_edges = [part_4.edges().sort_by_distance(p)[0] for p in [
        (-64.835, 23.92820323, -32.15),
    ]]
    fillet(fillet1_edges, radius=FILLET1_R)


solid = part_4.part
